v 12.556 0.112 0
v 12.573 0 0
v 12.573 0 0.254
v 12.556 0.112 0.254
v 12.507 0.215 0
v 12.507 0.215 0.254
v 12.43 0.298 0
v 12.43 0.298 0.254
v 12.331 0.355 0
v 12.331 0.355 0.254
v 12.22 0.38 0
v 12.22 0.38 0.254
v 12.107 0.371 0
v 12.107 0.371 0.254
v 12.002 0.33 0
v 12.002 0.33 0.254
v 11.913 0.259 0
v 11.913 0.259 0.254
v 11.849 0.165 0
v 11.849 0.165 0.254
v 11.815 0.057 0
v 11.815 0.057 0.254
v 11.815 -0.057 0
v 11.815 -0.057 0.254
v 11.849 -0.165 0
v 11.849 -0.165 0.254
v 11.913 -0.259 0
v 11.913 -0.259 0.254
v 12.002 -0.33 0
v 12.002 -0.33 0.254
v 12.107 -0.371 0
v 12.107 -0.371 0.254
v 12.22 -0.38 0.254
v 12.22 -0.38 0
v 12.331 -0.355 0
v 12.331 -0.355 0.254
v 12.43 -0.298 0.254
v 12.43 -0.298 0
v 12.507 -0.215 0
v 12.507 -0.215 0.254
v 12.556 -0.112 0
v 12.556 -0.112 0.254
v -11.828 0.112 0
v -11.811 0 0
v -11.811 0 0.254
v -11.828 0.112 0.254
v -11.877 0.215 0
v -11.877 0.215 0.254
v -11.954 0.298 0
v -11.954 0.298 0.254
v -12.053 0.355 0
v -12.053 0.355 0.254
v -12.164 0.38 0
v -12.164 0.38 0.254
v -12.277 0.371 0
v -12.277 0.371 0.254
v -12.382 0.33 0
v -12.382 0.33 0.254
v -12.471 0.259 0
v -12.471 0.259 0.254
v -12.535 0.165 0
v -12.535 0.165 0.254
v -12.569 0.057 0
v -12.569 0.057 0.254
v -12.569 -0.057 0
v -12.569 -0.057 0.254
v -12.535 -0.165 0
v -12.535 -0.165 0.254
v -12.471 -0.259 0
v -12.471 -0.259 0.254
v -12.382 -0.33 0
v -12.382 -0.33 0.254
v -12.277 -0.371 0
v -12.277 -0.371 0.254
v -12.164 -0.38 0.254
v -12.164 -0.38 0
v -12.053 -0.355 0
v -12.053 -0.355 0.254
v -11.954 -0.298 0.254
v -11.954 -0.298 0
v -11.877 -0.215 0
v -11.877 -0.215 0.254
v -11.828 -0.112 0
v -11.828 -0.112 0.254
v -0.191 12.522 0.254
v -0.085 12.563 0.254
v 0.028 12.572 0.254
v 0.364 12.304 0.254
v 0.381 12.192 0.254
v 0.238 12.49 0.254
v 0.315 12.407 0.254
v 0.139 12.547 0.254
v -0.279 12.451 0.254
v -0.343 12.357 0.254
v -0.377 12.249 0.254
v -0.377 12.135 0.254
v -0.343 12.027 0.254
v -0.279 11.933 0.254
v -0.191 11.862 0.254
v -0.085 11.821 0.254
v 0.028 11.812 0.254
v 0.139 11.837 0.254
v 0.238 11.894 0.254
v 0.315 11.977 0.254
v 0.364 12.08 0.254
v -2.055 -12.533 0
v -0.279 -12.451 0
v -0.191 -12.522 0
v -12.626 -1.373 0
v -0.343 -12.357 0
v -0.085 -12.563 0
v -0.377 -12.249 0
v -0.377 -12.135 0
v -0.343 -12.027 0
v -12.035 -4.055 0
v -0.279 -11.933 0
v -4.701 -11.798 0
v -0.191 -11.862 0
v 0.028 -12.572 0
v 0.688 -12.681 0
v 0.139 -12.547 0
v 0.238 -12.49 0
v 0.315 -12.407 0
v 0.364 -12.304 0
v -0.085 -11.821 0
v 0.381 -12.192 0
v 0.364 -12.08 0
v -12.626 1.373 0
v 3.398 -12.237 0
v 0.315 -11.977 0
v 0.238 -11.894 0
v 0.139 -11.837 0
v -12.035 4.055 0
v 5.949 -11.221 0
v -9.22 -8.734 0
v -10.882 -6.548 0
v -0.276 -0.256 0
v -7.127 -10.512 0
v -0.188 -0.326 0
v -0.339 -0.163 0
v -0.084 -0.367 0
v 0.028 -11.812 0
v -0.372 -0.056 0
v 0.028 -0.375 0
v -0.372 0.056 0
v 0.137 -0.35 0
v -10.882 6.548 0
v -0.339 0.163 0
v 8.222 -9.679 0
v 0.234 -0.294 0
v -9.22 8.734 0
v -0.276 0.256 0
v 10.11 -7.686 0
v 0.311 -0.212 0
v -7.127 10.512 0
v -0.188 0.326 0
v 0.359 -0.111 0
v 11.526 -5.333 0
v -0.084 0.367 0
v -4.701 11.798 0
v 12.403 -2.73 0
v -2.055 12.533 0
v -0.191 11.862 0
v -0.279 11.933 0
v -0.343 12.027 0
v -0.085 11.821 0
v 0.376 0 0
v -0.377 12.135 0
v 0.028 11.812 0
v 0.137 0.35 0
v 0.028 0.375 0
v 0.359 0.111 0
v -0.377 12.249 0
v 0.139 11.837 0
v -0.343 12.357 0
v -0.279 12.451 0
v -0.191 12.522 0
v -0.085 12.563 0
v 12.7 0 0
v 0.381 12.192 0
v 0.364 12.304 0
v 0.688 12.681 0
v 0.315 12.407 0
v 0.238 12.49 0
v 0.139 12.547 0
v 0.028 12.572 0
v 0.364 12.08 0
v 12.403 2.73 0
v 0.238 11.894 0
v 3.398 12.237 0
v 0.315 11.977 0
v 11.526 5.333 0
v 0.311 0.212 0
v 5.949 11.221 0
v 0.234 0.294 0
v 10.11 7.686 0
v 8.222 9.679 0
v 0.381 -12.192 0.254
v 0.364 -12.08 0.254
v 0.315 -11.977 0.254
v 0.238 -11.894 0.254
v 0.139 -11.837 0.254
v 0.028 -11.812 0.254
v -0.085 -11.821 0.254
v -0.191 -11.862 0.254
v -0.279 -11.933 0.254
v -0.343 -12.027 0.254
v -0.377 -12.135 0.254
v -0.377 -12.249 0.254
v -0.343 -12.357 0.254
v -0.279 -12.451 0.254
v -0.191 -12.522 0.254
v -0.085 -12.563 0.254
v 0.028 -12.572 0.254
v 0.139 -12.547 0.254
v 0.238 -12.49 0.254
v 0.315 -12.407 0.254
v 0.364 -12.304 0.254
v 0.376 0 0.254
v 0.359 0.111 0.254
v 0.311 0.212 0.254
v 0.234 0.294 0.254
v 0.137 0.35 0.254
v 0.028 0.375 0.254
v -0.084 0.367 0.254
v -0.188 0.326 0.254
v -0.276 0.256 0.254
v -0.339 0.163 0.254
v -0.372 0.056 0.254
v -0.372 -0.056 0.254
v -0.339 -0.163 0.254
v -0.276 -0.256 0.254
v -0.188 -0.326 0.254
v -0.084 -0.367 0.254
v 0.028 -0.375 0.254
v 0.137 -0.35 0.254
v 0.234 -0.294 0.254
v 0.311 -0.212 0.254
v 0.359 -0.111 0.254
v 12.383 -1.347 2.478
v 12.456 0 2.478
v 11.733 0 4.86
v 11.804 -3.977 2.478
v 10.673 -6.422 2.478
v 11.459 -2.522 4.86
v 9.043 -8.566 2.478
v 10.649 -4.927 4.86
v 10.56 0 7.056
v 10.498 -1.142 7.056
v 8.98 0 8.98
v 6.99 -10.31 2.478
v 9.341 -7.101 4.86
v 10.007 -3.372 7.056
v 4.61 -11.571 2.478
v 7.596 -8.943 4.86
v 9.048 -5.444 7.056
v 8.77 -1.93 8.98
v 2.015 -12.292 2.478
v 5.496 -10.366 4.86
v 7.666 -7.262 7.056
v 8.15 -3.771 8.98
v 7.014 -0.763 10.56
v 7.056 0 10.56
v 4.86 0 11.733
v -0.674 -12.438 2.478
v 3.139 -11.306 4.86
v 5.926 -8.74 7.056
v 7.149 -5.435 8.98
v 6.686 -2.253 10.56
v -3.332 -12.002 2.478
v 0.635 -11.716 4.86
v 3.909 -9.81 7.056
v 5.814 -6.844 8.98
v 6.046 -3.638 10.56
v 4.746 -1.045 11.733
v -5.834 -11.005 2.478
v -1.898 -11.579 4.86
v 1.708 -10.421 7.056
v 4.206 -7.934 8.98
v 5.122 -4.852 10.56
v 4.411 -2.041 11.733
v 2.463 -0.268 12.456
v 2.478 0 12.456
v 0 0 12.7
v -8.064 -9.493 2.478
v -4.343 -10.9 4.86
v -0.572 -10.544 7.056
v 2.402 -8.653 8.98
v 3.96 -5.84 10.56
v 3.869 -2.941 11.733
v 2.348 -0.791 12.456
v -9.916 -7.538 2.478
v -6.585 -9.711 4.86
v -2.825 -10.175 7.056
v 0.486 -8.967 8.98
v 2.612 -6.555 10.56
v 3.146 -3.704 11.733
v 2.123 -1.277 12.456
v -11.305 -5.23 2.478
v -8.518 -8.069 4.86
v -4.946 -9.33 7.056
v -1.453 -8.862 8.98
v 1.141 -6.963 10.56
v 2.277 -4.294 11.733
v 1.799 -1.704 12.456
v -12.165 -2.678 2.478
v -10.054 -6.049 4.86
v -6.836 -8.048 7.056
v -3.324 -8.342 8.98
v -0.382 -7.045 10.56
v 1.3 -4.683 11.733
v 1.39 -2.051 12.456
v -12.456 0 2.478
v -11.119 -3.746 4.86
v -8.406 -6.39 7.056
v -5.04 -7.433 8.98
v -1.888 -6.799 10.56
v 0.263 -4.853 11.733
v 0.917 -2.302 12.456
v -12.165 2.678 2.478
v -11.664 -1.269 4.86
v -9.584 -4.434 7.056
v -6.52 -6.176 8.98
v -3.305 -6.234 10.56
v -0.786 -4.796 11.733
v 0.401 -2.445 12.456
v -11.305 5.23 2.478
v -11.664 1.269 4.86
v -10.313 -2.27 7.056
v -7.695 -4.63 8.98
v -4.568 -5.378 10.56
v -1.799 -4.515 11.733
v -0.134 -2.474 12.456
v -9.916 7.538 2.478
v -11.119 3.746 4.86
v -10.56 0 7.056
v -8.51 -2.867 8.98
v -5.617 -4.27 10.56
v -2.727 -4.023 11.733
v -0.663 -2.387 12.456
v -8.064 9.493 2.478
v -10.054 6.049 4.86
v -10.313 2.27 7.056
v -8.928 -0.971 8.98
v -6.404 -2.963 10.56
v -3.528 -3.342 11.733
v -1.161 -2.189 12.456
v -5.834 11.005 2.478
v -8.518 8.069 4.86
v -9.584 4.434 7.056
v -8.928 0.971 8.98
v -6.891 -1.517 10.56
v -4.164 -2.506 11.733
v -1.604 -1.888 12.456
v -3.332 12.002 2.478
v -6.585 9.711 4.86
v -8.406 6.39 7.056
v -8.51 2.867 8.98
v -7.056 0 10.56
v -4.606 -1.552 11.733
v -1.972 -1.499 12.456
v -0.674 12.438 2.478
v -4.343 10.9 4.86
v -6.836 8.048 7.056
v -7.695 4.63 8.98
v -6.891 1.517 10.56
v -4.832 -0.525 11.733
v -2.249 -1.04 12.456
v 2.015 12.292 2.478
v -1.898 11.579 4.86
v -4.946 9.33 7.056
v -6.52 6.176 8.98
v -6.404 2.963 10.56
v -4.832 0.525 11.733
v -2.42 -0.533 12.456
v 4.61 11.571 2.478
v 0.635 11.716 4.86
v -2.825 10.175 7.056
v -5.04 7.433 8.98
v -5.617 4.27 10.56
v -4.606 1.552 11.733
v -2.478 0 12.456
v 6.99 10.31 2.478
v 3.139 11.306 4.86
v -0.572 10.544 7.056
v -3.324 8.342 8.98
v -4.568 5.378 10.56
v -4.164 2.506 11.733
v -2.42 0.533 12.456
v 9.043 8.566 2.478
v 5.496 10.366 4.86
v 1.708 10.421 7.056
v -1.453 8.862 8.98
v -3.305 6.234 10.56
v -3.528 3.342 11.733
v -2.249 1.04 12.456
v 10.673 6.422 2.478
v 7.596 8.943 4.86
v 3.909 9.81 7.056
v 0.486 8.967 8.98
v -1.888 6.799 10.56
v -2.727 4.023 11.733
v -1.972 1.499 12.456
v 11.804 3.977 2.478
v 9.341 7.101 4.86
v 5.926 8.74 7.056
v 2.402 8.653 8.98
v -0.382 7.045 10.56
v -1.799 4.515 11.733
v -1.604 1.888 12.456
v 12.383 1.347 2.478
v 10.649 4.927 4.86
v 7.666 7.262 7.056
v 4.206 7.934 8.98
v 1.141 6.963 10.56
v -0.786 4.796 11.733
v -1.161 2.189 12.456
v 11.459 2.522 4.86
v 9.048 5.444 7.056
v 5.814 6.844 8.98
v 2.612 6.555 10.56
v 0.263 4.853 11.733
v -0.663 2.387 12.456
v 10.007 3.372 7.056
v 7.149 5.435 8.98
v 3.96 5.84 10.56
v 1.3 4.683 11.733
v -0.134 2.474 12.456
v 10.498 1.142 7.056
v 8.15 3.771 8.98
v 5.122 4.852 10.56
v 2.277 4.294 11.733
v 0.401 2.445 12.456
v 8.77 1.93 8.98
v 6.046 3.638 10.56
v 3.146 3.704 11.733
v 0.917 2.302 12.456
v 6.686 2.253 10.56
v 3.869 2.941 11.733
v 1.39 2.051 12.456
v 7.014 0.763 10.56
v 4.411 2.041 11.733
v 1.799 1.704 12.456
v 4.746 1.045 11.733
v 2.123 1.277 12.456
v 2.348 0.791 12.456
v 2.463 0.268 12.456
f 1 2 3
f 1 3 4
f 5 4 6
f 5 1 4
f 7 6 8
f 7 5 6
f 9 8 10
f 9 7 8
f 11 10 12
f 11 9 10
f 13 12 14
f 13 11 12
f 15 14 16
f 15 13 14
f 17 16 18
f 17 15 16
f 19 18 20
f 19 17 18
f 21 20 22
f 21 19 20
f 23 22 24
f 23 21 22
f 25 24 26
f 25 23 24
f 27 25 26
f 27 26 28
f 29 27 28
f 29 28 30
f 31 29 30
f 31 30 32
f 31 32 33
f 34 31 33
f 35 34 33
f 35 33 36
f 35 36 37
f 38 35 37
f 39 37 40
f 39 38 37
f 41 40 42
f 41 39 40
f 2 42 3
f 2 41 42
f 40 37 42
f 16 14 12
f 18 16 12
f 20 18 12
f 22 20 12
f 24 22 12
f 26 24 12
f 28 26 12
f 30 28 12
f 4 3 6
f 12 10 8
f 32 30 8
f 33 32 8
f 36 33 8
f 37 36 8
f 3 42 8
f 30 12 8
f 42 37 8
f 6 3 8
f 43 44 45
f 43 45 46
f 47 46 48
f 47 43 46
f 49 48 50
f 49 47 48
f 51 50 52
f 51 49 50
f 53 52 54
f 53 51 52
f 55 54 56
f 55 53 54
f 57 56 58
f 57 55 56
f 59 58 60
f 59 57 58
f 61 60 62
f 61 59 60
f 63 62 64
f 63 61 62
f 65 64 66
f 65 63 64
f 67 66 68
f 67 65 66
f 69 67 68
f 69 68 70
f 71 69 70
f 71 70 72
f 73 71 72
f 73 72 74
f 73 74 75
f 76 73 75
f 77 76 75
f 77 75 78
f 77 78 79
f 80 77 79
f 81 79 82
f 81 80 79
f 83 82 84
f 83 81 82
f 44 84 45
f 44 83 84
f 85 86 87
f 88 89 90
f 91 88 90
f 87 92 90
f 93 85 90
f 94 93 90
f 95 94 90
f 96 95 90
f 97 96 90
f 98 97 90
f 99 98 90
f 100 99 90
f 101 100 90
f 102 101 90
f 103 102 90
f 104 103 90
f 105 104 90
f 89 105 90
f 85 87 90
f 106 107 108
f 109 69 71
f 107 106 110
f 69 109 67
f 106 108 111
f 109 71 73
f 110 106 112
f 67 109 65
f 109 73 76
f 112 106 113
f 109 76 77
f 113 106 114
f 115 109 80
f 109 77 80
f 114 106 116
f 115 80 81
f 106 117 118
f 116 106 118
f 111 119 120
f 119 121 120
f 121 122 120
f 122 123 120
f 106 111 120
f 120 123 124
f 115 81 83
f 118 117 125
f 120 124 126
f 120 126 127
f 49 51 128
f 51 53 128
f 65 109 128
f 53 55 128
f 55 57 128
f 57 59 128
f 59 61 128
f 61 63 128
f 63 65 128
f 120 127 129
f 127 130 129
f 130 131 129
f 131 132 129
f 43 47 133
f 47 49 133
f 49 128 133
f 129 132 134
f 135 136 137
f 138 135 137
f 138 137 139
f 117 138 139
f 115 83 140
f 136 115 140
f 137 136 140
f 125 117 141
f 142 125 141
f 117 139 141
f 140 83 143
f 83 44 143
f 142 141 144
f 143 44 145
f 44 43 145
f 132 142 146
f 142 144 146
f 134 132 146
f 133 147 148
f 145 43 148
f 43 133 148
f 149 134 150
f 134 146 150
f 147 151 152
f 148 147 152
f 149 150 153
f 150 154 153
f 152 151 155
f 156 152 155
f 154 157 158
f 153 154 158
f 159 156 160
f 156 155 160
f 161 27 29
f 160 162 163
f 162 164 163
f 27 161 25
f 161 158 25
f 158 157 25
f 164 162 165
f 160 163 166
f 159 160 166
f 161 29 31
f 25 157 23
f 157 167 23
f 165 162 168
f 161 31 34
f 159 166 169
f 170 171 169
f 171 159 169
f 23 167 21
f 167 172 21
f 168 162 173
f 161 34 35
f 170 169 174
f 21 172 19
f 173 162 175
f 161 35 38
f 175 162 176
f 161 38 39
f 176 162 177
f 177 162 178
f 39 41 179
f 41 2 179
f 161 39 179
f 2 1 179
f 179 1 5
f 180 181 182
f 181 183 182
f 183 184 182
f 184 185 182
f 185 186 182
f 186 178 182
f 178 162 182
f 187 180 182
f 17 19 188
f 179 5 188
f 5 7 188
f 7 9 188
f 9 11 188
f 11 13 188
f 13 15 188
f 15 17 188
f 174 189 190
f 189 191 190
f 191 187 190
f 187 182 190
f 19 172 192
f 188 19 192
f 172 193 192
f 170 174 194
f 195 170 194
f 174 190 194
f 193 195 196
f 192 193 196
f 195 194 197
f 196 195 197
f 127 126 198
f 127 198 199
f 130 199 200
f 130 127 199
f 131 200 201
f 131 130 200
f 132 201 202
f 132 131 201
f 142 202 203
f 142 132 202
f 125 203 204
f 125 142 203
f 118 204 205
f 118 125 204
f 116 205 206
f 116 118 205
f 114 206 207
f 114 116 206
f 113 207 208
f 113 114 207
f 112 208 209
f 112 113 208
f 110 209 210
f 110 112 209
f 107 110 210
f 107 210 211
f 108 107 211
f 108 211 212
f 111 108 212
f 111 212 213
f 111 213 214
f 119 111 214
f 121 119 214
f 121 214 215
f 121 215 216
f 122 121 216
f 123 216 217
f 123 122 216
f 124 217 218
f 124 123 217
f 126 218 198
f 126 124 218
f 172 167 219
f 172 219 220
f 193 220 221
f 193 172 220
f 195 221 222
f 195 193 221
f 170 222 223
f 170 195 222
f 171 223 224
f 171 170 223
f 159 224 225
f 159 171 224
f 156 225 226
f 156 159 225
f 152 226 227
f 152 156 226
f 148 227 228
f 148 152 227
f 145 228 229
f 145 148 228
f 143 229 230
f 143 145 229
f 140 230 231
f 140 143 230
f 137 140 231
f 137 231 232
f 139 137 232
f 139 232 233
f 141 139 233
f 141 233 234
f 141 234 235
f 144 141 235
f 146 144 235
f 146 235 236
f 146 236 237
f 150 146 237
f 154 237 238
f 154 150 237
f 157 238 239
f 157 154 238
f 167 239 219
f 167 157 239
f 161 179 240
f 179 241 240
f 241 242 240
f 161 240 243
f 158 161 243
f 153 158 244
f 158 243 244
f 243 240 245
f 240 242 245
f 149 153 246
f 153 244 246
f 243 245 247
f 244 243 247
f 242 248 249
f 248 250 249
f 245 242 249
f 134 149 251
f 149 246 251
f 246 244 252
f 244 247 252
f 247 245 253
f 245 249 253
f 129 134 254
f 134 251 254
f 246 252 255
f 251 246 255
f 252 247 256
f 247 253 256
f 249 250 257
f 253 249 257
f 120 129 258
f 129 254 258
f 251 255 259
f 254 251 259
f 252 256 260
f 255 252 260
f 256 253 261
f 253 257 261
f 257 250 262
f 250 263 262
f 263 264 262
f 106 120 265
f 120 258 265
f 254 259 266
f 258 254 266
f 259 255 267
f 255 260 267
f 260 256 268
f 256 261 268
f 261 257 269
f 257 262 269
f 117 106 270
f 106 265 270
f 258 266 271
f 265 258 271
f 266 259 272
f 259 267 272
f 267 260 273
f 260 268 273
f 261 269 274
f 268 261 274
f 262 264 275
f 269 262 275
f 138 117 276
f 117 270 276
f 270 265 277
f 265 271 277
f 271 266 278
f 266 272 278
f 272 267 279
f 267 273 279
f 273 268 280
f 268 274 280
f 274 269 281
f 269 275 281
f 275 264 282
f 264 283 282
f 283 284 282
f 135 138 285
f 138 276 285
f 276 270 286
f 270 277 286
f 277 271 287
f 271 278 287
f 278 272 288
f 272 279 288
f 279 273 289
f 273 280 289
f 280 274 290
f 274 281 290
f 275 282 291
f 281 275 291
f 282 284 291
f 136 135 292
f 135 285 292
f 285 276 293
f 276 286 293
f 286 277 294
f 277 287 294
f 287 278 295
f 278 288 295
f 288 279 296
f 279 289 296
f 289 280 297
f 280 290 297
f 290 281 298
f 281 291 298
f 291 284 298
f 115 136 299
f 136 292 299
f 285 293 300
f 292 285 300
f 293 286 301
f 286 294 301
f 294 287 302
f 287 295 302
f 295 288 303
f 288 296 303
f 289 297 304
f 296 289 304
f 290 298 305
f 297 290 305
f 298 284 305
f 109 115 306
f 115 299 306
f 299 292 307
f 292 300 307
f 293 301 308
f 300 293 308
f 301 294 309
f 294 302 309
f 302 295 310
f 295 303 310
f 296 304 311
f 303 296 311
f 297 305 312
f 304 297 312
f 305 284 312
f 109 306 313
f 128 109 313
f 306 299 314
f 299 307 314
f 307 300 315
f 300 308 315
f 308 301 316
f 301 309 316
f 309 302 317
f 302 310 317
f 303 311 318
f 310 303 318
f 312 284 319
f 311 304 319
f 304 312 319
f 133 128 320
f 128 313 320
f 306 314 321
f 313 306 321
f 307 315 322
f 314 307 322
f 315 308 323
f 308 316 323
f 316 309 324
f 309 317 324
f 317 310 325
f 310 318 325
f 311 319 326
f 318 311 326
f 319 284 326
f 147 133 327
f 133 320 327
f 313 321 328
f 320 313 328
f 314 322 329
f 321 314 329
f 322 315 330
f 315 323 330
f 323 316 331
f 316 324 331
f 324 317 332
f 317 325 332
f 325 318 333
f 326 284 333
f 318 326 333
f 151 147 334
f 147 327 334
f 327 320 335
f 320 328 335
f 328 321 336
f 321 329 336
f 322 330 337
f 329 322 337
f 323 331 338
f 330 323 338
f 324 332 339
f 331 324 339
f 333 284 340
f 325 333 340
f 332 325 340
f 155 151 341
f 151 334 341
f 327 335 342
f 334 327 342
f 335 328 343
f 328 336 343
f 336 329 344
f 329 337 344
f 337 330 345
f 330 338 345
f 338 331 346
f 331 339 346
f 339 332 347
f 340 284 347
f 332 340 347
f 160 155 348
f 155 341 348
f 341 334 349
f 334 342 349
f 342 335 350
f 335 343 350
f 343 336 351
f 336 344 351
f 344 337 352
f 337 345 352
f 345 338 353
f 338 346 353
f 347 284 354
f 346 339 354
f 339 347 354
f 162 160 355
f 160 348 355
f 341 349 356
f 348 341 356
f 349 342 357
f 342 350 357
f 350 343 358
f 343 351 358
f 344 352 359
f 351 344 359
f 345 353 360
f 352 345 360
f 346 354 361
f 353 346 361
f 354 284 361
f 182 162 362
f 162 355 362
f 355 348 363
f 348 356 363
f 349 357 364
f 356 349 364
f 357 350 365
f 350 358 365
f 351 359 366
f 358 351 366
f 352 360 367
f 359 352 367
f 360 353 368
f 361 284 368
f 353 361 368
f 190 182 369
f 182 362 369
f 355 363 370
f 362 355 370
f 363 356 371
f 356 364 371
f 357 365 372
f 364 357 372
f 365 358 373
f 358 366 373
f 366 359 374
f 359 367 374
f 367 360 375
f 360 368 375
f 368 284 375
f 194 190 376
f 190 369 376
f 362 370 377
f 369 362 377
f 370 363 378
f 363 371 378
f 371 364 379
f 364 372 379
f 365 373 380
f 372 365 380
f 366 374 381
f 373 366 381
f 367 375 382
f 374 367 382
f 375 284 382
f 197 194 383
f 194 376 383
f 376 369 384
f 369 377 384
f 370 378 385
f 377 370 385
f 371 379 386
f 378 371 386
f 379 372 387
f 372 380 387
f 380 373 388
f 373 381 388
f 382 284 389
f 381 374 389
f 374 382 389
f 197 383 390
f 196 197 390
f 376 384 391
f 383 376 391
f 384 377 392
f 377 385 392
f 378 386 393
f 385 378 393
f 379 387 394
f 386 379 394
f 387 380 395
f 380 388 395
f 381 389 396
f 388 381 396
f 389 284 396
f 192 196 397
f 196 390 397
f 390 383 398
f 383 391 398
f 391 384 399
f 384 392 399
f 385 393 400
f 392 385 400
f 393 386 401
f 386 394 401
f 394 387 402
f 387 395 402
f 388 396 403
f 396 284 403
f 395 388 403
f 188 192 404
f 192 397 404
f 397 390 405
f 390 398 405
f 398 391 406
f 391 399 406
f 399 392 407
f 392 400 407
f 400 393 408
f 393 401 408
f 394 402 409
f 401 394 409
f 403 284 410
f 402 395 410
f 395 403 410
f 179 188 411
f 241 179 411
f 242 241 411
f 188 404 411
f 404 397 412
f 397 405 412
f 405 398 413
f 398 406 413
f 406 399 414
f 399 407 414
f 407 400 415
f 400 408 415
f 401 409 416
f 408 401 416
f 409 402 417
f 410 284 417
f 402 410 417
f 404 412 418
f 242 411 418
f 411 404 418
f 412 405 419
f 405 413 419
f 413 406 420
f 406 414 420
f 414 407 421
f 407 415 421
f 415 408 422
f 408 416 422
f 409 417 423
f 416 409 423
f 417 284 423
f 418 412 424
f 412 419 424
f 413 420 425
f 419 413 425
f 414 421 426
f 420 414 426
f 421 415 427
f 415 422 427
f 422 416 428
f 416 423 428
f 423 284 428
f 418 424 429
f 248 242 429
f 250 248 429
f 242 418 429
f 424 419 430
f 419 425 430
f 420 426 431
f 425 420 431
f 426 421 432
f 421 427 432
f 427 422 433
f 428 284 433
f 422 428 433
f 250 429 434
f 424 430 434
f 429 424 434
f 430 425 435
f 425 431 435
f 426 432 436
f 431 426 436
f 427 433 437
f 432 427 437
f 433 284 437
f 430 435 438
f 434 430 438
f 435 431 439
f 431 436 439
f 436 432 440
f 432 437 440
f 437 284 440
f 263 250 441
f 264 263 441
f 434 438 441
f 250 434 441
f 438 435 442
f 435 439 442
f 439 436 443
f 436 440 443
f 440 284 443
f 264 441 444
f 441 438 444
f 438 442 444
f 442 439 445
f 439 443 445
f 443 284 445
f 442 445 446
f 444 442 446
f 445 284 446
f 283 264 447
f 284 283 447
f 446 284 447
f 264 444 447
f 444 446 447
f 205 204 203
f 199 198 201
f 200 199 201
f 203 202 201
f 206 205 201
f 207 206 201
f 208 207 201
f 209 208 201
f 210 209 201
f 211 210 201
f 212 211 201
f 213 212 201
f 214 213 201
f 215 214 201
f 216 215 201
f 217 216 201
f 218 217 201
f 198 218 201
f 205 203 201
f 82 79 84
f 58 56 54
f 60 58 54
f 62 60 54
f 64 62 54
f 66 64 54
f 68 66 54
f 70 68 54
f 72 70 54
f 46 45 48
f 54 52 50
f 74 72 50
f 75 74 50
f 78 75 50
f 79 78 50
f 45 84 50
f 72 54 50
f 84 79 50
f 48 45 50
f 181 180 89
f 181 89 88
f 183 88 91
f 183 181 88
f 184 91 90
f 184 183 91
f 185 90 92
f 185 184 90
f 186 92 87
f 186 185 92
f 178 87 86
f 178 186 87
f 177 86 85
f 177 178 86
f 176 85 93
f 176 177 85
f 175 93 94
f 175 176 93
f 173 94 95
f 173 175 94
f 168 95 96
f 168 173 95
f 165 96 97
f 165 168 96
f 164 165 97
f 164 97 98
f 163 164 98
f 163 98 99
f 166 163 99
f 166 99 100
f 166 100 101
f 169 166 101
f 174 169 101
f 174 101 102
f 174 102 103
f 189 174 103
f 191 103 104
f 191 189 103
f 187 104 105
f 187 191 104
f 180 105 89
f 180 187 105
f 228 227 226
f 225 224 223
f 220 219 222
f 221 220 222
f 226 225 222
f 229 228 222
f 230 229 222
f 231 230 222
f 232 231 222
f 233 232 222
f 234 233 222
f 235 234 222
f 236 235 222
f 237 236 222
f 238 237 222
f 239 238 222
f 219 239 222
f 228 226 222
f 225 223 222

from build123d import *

# Parameters (mm, degrees)
F3_W     = 29.70758
F3_H     = 25.697972
F4_DEPTH = 25.4
F5_R     = 0.375966
F6_DEPTH = 0.254
F5_R_2   = 0.381
F7_DEPTH = 0.254


with BuildPart() as f1:
    # F0 (on Front) → F1 (revolve)
    with BuildSketch(Plane.XZ):
        with BuildLine():
            Line((0, 12.7), (0, -12.7))
            ThreePointArc((0, -12.7), (12.7, 0), (0, 12.7))
        make_face()
    revolve(axis=Axis((0, 0, 0), (0, 0, -1)))

    # F3 (on offset) → F4 (cut)
    with BuildSketch(Plane.XY):
        Rectangle(F3_W, F3_H)
    extrude(amount=-F4_DEPTH, mode=Mode.SUBTRACT)

    # F5 (on Top) → F6 (cut)
    with BuildSketch(Plane.XY):
        Circle(F5_R)
    extrude(amount=F6_DEPTH, mode=Mode.SUBTRACT)

    # F5 (on Top) → F7 (cut)
    with BuildSketch(Plane.XY):
        Circle(F5_R)
        with Locations((0, -12.192)):
            Circle(F5_R_2)
        with Locations((0, 12.192)):
            Circle(F5_R_2)
        with Locations((12.192, 0)):
            Circle(F5_R_2)
        with Locations((-12.192, 0)):
            Circle(F5_R_2)
    extrude(amount=F7_DEPTH, mode=Mode.SUBTRACT)


solid = f1.part
